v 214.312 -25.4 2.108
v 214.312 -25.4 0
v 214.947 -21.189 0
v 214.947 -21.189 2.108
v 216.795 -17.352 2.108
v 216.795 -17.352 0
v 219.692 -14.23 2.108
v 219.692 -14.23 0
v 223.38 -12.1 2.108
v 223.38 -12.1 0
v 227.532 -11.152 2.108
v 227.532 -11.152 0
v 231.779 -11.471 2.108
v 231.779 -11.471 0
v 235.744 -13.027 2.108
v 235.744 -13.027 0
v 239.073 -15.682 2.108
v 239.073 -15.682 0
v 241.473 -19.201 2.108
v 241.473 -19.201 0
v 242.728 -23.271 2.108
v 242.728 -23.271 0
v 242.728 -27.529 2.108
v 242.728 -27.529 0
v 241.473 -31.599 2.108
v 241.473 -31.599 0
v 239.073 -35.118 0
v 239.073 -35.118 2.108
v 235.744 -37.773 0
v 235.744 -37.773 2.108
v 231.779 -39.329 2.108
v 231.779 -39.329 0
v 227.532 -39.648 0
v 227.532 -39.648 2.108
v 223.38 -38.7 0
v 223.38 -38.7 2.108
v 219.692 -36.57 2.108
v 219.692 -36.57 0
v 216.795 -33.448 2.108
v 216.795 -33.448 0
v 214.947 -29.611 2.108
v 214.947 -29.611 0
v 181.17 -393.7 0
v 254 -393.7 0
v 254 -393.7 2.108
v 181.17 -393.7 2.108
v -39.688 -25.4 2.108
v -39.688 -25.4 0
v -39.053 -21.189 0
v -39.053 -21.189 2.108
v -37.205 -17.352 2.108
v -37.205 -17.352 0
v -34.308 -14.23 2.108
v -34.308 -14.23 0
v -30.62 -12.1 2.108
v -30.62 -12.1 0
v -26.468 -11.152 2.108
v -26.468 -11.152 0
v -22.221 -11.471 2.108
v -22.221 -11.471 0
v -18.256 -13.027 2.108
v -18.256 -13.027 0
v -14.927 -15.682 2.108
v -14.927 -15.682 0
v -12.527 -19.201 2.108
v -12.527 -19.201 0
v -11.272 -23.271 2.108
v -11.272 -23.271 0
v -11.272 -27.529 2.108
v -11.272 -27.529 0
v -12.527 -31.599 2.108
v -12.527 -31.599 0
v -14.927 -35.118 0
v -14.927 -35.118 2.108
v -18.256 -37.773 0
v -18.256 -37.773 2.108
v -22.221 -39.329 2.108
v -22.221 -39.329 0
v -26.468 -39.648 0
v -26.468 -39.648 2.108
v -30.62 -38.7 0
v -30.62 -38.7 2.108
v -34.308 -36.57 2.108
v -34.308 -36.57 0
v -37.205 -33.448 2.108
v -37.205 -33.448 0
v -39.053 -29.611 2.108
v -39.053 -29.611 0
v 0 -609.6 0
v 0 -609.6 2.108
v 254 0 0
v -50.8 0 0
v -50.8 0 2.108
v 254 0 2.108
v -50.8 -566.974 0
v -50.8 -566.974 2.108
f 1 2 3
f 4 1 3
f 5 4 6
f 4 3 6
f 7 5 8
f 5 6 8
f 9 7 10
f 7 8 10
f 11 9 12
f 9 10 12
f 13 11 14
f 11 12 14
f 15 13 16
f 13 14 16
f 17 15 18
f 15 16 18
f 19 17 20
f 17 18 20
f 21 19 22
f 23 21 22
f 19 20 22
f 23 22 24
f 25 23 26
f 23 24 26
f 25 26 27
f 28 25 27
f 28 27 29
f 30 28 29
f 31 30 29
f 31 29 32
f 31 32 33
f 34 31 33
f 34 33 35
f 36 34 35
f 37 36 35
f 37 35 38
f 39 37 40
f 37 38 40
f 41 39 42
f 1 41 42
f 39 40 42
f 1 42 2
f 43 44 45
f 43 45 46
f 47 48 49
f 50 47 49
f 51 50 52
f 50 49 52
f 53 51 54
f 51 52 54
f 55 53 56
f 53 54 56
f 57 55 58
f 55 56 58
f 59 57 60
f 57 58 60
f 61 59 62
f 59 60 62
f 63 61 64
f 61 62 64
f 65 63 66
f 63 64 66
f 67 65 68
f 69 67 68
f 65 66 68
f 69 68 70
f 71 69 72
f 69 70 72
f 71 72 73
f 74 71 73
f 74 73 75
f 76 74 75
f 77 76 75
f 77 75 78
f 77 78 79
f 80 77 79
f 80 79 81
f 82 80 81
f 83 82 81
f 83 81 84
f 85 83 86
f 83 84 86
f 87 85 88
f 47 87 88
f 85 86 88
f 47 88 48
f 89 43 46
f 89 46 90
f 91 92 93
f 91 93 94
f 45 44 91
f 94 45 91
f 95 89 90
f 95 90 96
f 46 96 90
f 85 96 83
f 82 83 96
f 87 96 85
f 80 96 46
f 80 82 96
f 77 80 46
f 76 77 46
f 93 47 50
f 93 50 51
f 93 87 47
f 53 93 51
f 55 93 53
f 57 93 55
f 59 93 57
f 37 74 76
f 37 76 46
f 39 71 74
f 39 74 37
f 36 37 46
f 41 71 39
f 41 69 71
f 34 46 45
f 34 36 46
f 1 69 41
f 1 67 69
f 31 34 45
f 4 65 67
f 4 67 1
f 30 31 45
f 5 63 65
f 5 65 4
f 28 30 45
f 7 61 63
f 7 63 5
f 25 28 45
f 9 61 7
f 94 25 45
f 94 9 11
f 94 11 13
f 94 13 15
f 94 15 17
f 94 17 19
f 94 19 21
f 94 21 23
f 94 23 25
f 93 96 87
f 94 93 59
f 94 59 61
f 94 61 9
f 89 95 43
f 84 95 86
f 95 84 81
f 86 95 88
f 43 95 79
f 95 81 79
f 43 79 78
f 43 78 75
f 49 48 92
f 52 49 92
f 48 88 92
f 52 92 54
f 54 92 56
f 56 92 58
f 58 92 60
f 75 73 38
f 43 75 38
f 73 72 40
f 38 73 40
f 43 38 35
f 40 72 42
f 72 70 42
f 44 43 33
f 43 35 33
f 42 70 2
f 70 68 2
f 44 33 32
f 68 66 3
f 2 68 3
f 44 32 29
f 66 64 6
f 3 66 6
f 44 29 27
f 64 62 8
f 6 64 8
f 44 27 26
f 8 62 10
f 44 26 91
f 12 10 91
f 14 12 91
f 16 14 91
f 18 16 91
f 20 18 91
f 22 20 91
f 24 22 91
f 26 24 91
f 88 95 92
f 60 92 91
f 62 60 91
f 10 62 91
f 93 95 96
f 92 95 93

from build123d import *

# Parameters (mm, degrees)
SKETCH1_W           = 304.8
SKETCH1_H           = 635
BOSS_EXTRUDE1_DEPTH = 2.1082
SKETCH3_R           = 14.2875
CUT_EXTRUDE2_DEPTH  = 2.1082
SKETCH4_R           = 14.2875
CUT_EXTRUDE3_DEPTH  = 2.1082
CUT_EXTRUDE4_DEPTH  = 3.1082


with BuildPart() as part:
    # Sketch1 → Boss-Extrude1 (new body)
    with BuildSketch(Plane.XY):
        with Locations((101.6, -317.5)):
            Rectangle(SKETCH1_W, SKETCH1_H)
    extrude(amount=BOSS_EXTRUDE1_DEPTH)

    # Sketch3 → Cut-Extrude2 (cut)
    with BuildSketch(Plane(origin=(0, 0, 0), x_dir=(-1, 0, 0), z_dir=(0, 0, -1))):
        with Locations((25.4, -25.4)):
            Circle(SKETCH3_R)
    extrude(amount=-CUT_EXTRUDE2_DEPTH, mode=Mode.SUBTRACT)

    # Sketch4 → Cut-Extrude3 (cut)
    with BuildSketch(Plane(origin=(0, 0, 0), x_dir=(-1, 0, 0), z_dir=(0, 0, -1))):
        with Locations((-228.6, -25.4)):
            Circle(SKETCH4_R)
    extrude(amount=-CUT_EXTRUDE3_DEPTH, mode=Mode.SUBTRACT)

    # Sketch5 → Cut-Extrude4 (cut, through all)
    with BuildSketch(Plane(origin=(0, 0, 0), x_dir=(-1, 0, 0), z_dir=(0, 0, -1))):
        Polygon((-254, -635), (-254, -393.7), (-181.170170025, -393.7), (0, -609.6), (50.8, -566.973738736), (50.8, -635), align=None)
    extrude(amount=-CUT_EXTRUDE4_DEPTH, mode=Mode.SUBTRACT)


solid = part.part
